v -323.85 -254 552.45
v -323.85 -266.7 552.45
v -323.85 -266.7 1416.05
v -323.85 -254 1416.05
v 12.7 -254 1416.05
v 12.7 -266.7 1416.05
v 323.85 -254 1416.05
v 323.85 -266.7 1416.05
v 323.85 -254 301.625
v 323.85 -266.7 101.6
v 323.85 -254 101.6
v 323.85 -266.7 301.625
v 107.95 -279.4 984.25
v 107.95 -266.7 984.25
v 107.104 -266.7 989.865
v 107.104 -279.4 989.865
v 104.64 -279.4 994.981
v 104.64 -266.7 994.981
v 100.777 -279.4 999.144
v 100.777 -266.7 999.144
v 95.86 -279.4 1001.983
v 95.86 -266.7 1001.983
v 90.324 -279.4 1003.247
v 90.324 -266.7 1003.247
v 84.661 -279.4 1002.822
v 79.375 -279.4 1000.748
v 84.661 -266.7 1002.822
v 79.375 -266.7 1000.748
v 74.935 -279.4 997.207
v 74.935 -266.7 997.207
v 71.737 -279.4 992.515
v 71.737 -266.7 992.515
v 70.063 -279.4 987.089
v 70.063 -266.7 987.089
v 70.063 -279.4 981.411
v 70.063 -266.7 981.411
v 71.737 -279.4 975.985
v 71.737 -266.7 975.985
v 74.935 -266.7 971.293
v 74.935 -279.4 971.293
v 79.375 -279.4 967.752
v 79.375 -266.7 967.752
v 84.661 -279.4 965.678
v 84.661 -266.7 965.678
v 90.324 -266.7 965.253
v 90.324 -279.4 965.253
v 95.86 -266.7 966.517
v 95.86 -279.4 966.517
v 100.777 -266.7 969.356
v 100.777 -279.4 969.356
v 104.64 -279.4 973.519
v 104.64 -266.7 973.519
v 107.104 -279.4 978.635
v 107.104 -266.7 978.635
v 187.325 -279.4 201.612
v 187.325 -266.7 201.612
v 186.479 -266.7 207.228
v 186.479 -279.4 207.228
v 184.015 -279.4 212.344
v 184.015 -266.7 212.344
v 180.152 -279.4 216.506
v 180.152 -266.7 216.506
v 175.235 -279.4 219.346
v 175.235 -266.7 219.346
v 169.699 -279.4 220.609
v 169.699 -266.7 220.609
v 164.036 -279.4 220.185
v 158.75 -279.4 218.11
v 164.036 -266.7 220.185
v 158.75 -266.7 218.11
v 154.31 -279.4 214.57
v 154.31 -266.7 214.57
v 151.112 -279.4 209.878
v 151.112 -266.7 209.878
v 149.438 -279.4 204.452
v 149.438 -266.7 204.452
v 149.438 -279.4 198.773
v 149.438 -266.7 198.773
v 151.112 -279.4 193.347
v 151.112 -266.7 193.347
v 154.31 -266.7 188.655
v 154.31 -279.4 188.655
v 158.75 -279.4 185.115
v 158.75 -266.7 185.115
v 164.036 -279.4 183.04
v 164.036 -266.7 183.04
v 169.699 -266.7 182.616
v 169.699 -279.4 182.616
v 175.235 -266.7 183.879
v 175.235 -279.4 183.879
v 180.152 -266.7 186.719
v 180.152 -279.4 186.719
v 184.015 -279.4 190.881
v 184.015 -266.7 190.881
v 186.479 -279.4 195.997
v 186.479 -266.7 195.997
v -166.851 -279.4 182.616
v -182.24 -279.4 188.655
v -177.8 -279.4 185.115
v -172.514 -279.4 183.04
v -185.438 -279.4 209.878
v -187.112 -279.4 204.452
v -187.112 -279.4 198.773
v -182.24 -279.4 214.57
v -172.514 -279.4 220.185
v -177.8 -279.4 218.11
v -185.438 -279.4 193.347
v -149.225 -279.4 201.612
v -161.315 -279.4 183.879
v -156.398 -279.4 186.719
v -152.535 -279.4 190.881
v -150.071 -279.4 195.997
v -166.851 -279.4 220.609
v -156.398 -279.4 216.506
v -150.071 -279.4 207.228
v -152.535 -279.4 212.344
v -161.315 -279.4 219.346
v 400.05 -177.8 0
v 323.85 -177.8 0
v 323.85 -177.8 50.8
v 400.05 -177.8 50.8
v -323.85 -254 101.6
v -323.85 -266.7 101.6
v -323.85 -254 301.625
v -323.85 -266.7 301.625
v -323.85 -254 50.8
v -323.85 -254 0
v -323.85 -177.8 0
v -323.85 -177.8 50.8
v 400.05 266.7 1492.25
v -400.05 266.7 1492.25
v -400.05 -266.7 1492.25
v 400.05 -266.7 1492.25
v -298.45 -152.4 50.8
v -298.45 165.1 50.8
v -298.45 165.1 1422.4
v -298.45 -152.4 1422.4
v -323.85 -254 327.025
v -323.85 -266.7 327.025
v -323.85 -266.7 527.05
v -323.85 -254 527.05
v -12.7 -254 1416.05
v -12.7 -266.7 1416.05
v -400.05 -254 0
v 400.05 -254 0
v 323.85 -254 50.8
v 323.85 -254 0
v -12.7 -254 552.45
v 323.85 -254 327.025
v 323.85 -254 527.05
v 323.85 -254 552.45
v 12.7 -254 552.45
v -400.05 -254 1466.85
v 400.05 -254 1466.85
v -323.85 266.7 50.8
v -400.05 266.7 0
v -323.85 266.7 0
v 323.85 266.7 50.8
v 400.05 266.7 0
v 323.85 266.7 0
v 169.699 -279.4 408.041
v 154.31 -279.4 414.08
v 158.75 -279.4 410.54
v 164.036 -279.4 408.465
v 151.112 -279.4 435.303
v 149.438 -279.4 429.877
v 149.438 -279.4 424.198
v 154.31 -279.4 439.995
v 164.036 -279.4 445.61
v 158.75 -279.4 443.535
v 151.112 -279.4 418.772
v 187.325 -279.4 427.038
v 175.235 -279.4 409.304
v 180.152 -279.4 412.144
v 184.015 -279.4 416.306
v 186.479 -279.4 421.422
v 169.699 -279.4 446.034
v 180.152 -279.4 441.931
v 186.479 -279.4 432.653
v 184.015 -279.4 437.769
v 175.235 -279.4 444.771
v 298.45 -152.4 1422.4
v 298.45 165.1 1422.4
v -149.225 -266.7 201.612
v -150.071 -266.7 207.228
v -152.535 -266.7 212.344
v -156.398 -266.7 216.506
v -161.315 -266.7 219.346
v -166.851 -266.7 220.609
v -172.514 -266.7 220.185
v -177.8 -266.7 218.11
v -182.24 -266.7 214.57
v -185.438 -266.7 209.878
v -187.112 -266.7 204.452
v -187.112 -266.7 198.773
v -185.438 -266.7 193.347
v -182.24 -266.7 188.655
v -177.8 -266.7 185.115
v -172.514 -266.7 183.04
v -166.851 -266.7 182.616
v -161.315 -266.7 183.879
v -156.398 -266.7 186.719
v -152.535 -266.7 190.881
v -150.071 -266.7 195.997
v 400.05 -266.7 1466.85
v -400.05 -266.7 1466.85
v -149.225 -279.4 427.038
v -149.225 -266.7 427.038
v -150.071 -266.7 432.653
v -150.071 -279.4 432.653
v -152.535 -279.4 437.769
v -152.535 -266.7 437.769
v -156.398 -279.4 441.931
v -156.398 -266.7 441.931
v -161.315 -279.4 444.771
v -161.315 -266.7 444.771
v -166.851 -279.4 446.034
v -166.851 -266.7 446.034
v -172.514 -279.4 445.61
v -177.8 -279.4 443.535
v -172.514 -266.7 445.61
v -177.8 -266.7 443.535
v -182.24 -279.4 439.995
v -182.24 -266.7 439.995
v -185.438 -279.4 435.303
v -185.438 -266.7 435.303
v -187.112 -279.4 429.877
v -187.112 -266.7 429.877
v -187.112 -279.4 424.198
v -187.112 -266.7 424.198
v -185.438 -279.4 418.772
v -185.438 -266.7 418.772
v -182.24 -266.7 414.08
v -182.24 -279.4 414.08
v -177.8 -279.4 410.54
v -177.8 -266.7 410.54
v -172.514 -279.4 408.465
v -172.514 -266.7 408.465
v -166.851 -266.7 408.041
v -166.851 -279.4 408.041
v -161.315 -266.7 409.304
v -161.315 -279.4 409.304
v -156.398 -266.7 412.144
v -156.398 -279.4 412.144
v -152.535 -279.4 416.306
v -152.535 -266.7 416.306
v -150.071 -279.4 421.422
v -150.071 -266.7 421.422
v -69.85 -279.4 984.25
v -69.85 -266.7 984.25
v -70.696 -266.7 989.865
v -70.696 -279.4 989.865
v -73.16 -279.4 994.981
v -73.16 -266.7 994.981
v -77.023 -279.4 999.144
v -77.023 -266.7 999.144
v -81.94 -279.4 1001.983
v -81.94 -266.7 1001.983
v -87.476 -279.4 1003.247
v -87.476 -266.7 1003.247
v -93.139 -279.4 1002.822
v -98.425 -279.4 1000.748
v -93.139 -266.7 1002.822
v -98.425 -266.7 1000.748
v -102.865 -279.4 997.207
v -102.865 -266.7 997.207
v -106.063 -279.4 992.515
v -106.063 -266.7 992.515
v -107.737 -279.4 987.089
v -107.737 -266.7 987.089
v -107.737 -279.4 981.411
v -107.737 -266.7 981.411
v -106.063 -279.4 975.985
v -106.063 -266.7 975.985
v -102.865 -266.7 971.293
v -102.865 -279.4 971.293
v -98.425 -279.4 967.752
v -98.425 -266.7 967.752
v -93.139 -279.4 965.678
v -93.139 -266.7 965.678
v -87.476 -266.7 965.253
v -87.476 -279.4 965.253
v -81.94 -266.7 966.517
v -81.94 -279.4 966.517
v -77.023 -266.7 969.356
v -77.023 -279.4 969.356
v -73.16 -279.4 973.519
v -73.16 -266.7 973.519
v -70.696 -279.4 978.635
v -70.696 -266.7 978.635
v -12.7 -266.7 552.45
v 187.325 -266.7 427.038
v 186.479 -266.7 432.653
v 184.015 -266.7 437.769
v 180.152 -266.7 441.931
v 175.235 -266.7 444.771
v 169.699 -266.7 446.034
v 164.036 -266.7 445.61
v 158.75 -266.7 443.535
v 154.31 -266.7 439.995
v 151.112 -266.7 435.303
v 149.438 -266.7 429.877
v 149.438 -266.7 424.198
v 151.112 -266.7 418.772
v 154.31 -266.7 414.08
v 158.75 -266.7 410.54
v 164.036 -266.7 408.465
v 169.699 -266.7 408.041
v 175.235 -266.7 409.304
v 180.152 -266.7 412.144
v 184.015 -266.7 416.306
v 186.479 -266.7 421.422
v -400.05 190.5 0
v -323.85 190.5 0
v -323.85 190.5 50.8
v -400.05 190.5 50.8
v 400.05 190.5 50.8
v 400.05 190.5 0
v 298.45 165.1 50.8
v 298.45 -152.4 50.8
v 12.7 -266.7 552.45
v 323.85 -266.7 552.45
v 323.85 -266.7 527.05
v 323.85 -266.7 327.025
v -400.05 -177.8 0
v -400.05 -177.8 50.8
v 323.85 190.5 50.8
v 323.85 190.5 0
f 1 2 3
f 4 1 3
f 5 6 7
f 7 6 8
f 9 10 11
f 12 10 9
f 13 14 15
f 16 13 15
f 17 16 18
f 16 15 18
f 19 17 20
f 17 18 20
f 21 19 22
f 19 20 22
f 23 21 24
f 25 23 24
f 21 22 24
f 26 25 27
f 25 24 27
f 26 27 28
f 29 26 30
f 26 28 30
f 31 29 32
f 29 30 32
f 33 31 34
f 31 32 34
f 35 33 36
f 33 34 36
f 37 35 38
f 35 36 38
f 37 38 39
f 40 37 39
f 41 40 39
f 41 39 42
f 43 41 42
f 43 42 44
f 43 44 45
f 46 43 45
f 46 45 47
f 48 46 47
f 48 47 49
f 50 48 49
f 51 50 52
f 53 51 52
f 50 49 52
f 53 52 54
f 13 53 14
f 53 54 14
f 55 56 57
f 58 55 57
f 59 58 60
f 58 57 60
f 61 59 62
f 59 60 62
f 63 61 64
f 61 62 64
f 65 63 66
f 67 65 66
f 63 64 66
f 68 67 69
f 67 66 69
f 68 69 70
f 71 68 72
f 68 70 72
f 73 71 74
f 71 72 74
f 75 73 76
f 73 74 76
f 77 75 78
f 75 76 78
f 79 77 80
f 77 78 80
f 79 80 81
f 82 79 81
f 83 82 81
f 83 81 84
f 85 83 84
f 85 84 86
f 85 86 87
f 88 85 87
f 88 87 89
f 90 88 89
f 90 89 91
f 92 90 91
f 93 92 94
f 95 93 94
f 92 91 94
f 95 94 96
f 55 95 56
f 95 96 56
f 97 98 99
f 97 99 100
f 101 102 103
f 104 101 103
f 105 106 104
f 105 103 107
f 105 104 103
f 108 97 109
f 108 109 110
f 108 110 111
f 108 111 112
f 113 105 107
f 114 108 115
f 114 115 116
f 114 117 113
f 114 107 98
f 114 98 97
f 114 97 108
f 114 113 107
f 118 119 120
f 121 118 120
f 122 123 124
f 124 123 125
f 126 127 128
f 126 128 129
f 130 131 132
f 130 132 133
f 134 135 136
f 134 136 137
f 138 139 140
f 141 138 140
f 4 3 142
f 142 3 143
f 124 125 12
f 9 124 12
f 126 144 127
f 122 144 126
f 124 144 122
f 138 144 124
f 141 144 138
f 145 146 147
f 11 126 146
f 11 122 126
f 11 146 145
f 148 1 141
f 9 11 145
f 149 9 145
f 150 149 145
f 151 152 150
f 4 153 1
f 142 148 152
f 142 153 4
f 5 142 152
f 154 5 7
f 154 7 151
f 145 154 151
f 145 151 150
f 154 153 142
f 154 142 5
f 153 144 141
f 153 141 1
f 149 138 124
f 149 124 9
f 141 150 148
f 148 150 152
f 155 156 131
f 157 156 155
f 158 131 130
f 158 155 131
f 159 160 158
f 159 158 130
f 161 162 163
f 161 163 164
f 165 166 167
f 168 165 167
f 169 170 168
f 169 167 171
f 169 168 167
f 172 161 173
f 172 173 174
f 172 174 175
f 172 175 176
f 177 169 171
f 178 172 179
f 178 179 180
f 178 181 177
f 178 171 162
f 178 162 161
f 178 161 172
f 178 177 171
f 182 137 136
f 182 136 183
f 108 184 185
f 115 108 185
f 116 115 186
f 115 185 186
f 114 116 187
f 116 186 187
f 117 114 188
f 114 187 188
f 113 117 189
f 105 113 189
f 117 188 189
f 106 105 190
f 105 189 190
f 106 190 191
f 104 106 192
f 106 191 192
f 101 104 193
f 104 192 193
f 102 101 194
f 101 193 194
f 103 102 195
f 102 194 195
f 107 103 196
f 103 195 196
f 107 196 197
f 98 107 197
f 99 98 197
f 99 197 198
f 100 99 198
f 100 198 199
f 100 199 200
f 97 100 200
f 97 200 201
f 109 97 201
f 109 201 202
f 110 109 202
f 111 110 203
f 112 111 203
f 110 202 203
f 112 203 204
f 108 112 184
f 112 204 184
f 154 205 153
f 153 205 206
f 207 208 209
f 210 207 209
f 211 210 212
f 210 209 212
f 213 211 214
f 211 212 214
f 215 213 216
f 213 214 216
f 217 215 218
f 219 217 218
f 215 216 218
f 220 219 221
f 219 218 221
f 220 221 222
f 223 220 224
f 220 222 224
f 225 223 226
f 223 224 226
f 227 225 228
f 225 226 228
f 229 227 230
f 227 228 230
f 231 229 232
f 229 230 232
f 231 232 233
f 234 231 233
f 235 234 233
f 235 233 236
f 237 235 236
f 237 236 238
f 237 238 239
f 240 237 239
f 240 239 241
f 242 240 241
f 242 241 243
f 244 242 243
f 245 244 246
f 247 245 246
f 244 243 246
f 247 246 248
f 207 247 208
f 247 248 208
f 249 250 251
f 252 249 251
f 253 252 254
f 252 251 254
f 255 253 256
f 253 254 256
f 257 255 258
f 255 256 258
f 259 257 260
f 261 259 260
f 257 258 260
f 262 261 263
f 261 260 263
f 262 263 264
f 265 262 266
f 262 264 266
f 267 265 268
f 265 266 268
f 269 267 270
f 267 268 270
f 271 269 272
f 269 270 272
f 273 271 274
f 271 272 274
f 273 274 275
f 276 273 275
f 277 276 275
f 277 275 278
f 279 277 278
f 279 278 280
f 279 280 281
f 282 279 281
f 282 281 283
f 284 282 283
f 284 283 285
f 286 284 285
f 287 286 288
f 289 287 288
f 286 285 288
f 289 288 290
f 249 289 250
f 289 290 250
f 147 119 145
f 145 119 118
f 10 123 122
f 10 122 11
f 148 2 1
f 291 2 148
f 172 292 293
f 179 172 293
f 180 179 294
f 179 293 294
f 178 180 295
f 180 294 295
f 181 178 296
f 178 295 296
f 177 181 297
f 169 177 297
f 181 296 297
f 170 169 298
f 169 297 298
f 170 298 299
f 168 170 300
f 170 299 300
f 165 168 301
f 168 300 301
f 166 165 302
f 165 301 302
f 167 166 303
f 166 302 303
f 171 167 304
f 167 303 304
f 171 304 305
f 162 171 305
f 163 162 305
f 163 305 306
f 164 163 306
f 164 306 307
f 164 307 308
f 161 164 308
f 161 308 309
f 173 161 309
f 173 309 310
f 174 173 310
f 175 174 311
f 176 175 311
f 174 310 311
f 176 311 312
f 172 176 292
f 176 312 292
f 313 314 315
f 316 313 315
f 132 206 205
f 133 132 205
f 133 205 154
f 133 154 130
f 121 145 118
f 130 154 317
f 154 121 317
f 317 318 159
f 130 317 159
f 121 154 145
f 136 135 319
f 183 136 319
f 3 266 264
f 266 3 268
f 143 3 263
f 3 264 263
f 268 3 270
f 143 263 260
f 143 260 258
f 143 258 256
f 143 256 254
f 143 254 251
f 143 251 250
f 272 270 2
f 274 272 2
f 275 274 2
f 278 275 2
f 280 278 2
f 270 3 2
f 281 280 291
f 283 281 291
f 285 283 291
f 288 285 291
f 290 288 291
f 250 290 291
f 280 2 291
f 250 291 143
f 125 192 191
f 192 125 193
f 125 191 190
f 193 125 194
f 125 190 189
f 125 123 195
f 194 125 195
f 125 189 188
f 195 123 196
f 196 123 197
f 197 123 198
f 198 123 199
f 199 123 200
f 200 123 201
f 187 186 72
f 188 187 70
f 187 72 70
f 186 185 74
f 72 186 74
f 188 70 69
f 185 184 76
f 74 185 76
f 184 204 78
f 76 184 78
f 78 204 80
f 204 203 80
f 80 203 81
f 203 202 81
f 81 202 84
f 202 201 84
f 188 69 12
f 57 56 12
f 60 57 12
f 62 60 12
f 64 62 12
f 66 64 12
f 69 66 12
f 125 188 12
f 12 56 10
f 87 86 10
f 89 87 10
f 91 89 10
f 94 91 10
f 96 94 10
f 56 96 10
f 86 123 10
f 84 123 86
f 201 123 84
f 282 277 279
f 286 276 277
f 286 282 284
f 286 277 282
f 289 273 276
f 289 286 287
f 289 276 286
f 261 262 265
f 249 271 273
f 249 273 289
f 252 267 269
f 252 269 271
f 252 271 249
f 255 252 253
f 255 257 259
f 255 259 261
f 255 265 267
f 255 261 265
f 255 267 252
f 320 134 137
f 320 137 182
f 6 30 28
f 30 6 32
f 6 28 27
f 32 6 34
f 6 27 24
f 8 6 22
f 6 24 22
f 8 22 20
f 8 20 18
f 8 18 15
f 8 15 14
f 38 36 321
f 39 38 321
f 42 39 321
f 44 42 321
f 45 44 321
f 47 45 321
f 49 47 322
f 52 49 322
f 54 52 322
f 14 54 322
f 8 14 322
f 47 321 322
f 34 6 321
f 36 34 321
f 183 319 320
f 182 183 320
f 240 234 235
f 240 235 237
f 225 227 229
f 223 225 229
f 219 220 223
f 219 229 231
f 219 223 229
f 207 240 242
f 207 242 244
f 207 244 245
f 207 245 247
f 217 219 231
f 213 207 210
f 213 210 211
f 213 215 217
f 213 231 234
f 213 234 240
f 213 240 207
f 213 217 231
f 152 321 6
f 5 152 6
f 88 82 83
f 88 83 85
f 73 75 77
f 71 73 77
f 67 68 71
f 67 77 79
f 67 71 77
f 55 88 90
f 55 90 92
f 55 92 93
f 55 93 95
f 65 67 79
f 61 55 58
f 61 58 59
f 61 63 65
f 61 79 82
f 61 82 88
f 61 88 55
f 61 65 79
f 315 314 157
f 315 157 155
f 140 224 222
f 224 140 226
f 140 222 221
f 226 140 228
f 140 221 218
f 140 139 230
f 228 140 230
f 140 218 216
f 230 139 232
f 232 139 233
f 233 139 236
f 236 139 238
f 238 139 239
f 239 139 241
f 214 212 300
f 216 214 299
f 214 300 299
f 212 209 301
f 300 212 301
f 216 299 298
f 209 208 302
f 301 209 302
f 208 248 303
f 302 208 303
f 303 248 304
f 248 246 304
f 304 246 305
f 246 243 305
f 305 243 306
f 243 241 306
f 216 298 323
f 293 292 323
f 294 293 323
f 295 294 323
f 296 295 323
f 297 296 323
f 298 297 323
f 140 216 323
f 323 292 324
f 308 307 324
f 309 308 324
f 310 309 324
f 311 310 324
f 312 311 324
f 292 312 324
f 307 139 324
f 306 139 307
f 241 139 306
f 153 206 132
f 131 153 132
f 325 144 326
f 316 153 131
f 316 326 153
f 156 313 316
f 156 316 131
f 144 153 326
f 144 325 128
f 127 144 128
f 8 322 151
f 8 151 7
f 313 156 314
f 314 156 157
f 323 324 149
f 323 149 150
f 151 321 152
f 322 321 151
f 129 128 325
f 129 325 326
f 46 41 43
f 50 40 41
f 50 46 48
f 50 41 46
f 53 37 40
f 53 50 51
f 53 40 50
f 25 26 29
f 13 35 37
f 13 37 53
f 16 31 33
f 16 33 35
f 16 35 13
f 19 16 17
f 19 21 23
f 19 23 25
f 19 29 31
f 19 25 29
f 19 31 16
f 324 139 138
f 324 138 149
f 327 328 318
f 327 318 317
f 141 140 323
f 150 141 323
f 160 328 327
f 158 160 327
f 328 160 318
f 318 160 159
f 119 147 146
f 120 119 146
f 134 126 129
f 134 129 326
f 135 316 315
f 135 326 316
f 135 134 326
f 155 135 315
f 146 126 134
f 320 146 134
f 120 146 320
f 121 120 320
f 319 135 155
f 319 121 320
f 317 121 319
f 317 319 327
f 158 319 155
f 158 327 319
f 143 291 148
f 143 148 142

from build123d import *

# Parameters (mm, degrees)
F0_W      = 800.1
F0_H      = 533.4
F1_DEPTH  = 1492.25
F2_W      = 647.7
F2_H      = 200.025
F2_W_2    = 311.15
F2_H_2    = 863.6
F3_DEPTH  = 12.7
F2_H_3    = 50.8
F4_DEPTH  = 533.401
F5_W      = 368.3
F5_H      = 50.8
F6_DEPTH  = 800.101
F7_W      = 596.9
F7_H      = 317.5
F8_DEPTH  = 1371.6
F9_R      = 19.05
F10_DEPTH = 12.7


with BuildPart() as f1:
    # F0 (on Top) → F1 (new body)
    with BuildSketch(Plane.XY):
        Rectangle(F0_W, F0_H)
    extrude(amount=F1_DEPTH)

    # F2 (on face) → F3 (cut)
    with BuildSketch(Plane.XZ.offset(266.7)):
        Polygon((-400.05, 0), (-323.85, 0), (-323.85, 50.8), (323.85, 50.8), (323.85, 0), (400.05, 0), (400.05, 1466.85), (-400.05, 1466.85), align=None)
        with Locations((0, 201.6125)):
            Rectangle(F2_W, F2_H, mode=Mode.SUBTRACT)
        with Locations((0, 427.0375)):
            Rectangle(F2_W, F2_H, mode=Mode.SUBTRACT)
        with Locations((-168.275, 984.25)):
            Rectangle(F2_W_2, F2_H_2, mode=Mode.SUBTRACT)
        with Locations((168.275, 984.25)):
            Rectangle(F2_W_2, F2_H_2, mode=Mode.SUBTRACT)
    extrude(amount=-F3_DEPTH, mode=Mode.SUBTRACT)

    # F2 (on face) → F4 (cut, through all)
    with BuildSketch(Plane.XZ.offset(266.7)):
        with Locations((0, 25.4)):
            Rectangle(F2_W, F2_H_3)
    extrude(amount=-F4_DEPTH, mode=Mode.SUBTRACT)

    # F5 (on face) → F6 (cut, through all)
    with BuildSketch(Plane.YZ.offset(400.05)):
        with Locations((6.35, 25.4)):
            Rectangle(F5_W, F5_H)
    extrude(amount=-F6_DEPTH, mode=Mode.SUBTRACT)

    # F7 (on face) → F8 (cut)
    with BuildSketch(Plane(origin=(0, 0, 50.8), x_dir=(1, 0, 0), z_dir=(0, 0, -1))):
        with Locations((0, -6.35)):
            Rectangle(F7_W, F7_H)
    extrude(amount=-F8_DEPTH, mode=Mode.SUBTRACT)

    # F9 (on face) → F10 (join)
    with BuildSketch(Plane.XZ.offset(266.7)):
        with Locations((-88.9, 984.25)):
            Circle(F9_R)
        with Locations((88.9, 984.25)):
            Circle(F9_R)
        with Locations((168.275, 427.0375)):
            Circle(F9_R)
        with Locations((-168.275, 427.0375)):
            Circle(F9_R)
        with Locations((-168.275, 201.6125)):
            Circle(F9_R)
        with Locations((168.275, 201.6125)):
            Circle(F9_R)
    extrude(amount=F10_DEPTH)


solid = f1.part
